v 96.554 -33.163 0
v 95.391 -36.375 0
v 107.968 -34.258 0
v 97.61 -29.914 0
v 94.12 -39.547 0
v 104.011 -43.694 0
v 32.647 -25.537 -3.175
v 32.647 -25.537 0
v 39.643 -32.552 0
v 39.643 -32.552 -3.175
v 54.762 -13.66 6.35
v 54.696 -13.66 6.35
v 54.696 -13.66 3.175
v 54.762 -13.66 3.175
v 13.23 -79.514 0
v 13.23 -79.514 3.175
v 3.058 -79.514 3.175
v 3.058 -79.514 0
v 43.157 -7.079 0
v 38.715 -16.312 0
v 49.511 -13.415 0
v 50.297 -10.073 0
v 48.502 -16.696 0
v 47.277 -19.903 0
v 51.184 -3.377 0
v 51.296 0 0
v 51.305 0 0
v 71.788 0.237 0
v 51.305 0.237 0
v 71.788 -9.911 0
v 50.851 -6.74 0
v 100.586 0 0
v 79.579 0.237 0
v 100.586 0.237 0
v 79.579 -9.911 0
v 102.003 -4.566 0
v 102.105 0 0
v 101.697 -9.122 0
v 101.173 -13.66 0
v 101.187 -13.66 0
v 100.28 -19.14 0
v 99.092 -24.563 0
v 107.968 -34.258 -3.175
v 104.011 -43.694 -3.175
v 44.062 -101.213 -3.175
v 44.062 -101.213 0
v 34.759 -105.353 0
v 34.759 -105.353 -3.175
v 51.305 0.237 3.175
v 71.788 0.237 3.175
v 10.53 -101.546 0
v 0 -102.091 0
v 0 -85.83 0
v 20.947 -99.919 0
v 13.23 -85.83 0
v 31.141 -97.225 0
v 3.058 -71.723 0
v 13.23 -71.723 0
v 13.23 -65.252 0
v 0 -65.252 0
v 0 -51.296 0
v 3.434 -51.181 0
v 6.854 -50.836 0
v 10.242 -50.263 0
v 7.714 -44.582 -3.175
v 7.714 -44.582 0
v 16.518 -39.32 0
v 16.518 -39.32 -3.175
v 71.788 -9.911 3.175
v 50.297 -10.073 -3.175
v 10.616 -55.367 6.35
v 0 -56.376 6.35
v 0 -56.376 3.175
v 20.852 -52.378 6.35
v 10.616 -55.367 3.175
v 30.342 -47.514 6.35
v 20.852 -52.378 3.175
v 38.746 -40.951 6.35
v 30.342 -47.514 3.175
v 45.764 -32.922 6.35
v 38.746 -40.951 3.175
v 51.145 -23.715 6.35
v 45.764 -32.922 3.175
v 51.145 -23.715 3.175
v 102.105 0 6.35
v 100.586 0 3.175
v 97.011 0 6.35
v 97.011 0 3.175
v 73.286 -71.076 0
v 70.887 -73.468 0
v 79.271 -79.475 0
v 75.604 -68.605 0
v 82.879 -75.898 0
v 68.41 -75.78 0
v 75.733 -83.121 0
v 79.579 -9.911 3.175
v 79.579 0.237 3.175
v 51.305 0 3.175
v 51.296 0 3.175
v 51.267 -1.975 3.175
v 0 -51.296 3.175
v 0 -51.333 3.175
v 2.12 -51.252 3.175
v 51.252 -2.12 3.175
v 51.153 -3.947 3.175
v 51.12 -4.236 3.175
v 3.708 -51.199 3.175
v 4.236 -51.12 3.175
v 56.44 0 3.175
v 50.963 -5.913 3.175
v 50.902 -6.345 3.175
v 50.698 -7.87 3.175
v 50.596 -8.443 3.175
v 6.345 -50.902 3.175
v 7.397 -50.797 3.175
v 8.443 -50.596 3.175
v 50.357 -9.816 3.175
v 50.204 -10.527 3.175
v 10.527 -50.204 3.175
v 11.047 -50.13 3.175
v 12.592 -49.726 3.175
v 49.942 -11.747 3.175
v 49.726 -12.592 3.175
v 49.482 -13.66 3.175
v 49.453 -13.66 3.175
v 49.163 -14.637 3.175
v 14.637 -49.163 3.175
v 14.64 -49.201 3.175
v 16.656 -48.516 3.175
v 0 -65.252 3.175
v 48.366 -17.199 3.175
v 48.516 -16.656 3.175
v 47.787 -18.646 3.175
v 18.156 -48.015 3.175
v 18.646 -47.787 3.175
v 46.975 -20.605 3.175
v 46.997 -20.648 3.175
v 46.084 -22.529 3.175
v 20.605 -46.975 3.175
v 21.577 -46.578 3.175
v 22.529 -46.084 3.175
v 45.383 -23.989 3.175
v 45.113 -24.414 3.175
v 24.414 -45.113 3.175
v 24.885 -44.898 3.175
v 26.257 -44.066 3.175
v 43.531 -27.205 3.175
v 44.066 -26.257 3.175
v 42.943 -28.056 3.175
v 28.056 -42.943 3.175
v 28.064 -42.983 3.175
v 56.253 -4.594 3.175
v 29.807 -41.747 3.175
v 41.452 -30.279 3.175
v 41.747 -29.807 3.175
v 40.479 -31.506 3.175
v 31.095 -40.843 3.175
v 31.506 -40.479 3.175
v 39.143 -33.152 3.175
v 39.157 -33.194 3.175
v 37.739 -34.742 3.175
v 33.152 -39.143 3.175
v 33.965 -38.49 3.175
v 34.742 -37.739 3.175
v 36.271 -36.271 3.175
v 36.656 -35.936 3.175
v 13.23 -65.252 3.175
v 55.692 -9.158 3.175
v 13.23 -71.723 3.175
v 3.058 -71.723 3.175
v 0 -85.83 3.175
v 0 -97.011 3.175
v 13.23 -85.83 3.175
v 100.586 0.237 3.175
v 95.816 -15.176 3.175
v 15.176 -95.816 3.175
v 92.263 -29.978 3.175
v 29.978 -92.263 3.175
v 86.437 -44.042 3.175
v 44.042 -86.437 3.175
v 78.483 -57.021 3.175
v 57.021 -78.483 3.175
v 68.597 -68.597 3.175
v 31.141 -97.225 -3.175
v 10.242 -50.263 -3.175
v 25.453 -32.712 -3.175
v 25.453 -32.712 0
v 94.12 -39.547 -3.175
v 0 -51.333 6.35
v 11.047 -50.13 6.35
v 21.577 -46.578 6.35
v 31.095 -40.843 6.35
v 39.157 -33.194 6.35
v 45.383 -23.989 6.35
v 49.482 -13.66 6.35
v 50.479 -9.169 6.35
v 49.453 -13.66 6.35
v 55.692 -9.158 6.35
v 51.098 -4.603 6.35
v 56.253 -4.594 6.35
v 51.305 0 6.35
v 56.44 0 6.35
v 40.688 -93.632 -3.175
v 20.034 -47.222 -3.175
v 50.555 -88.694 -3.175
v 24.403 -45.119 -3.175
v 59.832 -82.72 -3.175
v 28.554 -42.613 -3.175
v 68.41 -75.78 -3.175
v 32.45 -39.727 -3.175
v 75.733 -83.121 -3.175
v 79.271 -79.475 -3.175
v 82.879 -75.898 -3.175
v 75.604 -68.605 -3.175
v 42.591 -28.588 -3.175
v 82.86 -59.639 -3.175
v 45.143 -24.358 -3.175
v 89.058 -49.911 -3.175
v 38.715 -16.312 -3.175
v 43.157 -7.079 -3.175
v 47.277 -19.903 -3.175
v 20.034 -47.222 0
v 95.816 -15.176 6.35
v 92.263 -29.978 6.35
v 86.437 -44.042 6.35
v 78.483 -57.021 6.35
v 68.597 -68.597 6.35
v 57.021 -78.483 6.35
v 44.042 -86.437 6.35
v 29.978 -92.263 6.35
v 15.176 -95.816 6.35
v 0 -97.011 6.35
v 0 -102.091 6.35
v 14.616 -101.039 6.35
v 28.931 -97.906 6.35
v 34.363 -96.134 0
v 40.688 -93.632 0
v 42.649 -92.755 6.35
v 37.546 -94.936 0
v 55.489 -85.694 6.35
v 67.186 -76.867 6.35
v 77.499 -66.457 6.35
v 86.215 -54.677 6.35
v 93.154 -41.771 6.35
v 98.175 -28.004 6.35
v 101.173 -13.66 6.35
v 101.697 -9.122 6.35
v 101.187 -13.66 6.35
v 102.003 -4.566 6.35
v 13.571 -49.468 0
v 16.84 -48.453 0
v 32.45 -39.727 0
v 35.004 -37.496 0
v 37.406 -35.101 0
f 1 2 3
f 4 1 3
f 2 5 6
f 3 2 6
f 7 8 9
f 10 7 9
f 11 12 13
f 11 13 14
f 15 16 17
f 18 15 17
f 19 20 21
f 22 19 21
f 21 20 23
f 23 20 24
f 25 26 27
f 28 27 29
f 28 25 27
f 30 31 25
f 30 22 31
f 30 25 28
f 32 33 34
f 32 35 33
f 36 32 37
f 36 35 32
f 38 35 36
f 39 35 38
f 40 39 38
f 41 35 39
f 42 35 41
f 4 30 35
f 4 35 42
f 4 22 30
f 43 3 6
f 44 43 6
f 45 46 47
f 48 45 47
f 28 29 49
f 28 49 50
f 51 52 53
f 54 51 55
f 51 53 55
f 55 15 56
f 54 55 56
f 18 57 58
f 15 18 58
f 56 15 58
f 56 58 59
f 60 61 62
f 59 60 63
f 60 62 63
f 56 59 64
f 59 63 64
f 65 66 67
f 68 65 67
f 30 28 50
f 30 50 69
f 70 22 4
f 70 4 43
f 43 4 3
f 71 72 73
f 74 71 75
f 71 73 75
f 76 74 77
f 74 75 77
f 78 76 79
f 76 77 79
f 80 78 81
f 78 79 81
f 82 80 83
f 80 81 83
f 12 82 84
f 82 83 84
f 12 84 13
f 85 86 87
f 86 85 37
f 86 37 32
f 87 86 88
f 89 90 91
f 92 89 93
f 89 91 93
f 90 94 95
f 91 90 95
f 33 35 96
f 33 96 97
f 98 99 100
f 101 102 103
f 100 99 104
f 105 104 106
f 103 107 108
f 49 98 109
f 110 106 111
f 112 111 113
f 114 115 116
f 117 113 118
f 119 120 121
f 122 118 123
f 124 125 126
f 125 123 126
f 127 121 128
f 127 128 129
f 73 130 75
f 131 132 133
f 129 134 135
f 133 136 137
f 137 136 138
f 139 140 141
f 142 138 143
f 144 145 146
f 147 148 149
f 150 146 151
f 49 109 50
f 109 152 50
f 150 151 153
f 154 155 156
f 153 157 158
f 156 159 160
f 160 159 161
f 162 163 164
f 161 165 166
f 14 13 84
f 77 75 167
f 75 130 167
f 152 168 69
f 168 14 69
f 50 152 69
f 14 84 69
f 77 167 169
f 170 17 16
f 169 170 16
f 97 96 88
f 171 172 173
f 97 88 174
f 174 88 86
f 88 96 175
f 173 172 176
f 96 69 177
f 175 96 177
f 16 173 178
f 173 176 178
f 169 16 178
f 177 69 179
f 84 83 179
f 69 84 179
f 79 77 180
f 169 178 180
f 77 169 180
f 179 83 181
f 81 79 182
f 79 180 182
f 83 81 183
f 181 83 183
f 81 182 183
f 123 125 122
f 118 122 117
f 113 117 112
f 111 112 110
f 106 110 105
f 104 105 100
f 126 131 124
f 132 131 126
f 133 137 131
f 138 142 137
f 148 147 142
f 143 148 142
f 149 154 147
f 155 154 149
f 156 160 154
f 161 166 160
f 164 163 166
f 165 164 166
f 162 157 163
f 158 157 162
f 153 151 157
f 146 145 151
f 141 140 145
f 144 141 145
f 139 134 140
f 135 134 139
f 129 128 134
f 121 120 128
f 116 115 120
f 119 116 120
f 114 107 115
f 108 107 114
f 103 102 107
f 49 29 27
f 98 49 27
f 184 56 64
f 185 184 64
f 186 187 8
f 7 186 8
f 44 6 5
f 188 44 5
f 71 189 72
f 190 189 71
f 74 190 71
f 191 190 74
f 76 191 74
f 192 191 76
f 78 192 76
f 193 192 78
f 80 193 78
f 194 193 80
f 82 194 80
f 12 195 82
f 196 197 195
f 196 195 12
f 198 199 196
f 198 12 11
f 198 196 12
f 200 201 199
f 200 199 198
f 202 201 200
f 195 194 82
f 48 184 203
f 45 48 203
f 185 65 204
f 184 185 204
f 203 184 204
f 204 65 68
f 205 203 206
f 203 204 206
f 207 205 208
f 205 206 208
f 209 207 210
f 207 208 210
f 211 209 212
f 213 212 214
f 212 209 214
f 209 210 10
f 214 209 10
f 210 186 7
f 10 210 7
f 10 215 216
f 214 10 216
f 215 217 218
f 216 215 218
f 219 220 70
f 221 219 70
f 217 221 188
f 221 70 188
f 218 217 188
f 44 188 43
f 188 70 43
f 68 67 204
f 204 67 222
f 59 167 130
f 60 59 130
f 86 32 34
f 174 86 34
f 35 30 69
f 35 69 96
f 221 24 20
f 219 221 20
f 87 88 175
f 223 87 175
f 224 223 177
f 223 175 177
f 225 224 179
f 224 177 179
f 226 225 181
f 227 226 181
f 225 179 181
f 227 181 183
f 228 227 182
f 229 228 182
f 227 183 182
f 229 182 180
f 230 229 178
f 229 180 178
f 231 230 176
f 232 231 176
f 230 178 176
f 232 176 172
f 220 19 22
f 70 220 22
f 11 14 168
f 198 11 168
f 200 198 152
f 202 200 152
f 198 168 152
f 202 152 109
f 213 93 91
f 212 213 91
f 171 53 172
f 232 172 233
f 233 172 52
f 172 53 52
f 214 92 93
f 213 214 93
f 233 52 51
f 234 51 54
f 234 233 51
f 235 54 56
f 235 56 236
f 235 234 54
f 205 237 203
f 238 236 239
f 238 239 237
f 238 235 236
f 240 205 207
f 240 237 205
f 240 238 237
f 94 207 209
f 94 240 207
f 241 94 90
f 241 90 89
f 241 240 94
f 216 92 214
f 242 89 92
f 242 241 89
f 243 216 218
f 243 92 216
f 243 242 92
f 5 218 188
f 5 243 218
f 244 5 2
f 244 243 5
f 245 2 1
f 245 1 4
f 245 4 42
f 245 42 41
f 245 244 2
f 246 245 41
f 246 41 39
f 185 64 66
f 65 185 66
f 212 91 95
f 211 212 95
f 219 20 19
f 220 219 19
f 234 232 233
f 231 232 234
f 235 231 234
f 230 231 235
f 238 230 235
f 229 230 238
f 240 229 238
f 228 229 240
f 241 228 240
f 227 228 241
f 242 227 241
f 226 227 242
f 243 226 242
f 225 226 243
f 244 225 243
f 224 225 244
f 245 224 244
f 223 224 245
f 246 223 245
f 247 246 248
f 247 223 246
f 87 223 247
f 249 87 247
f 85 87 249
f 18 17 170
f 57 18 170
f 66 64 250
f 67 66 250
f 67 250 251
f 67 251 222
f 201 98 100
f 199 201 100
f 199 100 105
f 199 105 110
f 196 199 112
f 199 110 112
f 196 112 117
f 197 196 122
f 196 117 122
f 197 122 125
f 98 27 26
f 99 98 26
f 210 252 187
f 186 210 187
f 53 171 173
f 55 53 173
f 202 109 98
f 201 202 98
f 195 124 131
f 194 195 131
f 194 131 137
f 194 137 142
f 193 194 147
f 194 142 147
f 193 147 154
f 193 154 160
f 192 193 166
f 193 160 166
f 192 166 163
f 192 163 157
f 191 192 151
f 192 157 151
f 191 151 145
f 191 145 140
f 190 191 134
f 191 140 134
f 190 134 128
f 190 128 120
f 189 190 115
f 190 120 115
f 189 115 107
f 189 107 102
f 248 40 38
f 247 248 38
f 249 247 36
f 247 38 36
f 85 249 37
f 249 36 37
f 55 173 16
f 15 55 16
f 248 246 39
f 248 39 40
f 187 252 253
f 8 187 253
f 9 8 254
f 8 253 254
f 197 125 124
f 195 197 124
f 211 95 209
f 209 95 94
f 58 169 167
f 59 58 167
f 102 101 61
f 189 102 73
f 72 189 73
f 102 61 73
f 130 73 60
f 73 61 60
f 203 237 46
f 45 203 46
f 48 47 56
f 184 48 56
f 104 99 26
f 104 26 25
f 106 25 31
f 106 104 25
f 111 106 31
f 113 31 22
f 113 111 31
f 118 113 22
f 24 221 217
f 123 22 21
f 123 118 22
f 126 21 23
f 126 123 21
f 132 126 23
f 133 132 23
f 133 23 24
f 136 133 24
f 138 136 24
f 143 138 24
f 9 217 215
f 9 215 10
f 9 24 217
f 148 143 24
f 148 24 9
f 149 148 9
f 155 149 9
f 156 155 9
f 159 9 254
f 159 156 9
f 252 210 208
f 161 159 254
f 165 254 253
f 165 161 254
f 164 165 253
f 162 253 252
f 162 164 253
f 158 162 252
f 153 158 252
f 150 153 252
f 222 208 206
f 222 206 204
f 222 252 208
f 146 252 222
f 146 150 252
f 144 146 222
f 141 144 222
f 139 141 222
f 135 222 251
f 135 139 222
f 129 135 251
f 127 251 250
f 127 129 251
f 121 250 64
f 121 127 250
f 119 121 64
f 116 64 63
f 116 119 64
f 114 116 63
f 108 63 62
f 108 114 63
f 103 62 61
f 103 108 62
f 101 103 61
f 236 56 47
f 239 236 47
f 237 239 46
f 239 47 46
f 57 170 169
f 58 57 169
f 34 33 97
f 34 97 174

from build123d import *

# Parameters (mm, degrees)
F1_DEPTH  = 3.175
F4_DEPTH  = 3.175
F6_DEPTH  = 6.35
F7_DEPTH  = 3.175
F9_DEPTH  = 25.4
F11_DEPTH = 3.175
F13_DEPTH = 3.175
F14_DEPTH = 3.175
F15_DEPTH = 6.351


with BuildPart() as f1:
    # F0 (on Top) → F1 (new body)
    with BuildSketch(Plane.XY):
        with BuildLine():
            Line((0, -51.2956328023), (0, -102.09075941))
            ThreePointArc((0, -102.09075941), (72.1890682753, -72.1890682753), (102.09075941, 0))
            Line((102.09075941, 0), (51.2956328023, 0))
            ThreePointArc((51.2956328023, 0), (36.2714897998, -36.2714897998), (0, -51.2956328023))
        make_face()
    extrude(amount=F1_DEPTH)

    # F3 (on face) → F4 (join)
    with BuildSketch(Plane.XY.offset(3.175)):
        with BuildLine():
            ThreePointArc((0, -56.3756328023), (39.8635922482, -39.8635922482), (56.3756328023, 0))
            Line((56.3756328023, 0), (51.3330261441, 0))
            ThreePointArc((51.3330261441, 0), (36.2979308853, -36.2979308853), (0, -51.3330261441))
            Line((0, -51.3330261441), (0, -56.3756328023))
        make_face()
        with BuildLine():
            Line((102.09075941, 0), (97.01075941, 0))
            ThreePointArc((97.01075941, 0), (68.5969658269, -68.5969658269), (0, -97.01075941))
            Line((0, -97.01075941), (0, -102.09075941))
            ThreePointArc((0, -102.09075941), (72.1890682753, -72.1890682753), (102.09075941, 0))
        make_face()
    extrude(amount=F4_DEPTH)

    # F5 (on Top) → F6 (join)
    with BuildSketch(Plane.XY):
        with BuildLine():
            ThreePointArc((54.7619331998, -13.660392724), (56.0189261095, -6.8815386855), (56.4400182242, 0))
            Line((56.4400182242, 0), (51.3051767249, 0))
            ThreePointArc((51.3051767249, 0), (50.8400637591, -6.8926827684), (49.4531579316, -13.660392724))
            Line((49.4531579316, -13.660392724), (54.7619331998, -13.660392724))
        make_face()
        with BuildLine():
            Line((102.1051767249, 0), (97.1390098326, 0))
            ThreePointArc((97.1390098326, 0), (96.8973822865, -6.8472284381), (96.1737017167, -13.660392724))
            Line((96.1737017167, -13.660392724), (101.1872560388, -13.660392724))
            ThreePointArc((101.1872560388, -13.660392724), (101.8754380952, -6.8455990928), (102.1051767249, 0))
        make_face()
    extrude(amount=F6_DEPTH)

    # F2 (on Top) → F7 (join)
    with BuildSketch(Plane.XY):
        Polygon((65.3862244444, -13.4132344524), (65.3862244444, 0.2373858813), (51.3049019501, 0.2373858813), (51.3049019501, -13.4632168472), align=None)
        Polygon((100.5855267867, 0.2373858813), (85.8938746733, 0.2373858813), (85.9641355587, -13.4132344524), (100.5855267867, -13.4132344524), align=None)
    extrude(amount=F7_DEPTH)

    # F8 (on face) → F9 (cut)
    with BuildSketch(Plane.XY.offset(3.175)):
        Polygon((0, -85.8303158734), (13.2304336887, -85.8303158734), (13.2304336887, -79.5142199461), (6.7552071823, -79.5142199461), (3.0578118576, -79.5142199461), (3.0578118576, -71.7228521654), (6.7552071823, -71.7228521654), (13.2304336887, -71.7228521654), (13.2304336887, -65.2524047592), (0, -65.2524047592), align=None)
    extrude(amount=-F9_DEPTH, mode=Mode.SUBTRACT)

    # F10 (on face) → F11 (join)
    with BuildSketch(Plane(origin=(0, 0, 0), x_dir=(1, 0, 0), z_dir=(0, 0, -1))):
        with BuildLine():
            ThreePointArc((39.6434592285, 32.5520826521), (37.980845771, 34.4774897449), (36.2248193412, 36.3181002847))
            Line((36.2248193412, 36.3181002847), (29.0498583475, 29.1246633635))
            Line((29.0498583475, 29.1246633635), (32.646576808, 25.5371828667))
            Line((32.646576808, 25.5371828667), (39.6434592285, 32.5520826521))
        make_face()
        with BuildLine():
            Line((29.0498583475, 29.1246633635), (36.2248193412, 36.3181002847))
            ThreePointArc((36.2248193412, 36.3181002847), (34.3796988436, 38.0693873344), (32.4500223073, 39.7270436459))
            Line((32.4500223073, 39.7270436459), (25.4531398869, 32.7121438604))
            Line((25.4531398869, 32.7121438604), (29.0498583475, 29.1246633635))
        make_face()
        with BuildLine():
            Line((36.2248193412, 36.3181002847), (72.0961827352, 72.2818344532))
            ThreePointArc((72.0961827352, 72.2818344532), (70.2749350461, 74.0537417095), (68.4101530773, 75.7797737714))
            Line((68.4101530773, 75.7797737714), (32.4500223073, 39.7270436459))
            ThreePointArc((32.4500223073, 39.7270436459), (34.3796988436, 38.0693873344), (36.2248193412, 36.3181002847))
        make_face()
        with BuildLine():
            ThreePointArc((75.6035899985, 68.6048127777), (73.8727679087, 70.4651496728), (72.0961827352, 72.2818344532))
            Line((72.0961827352, 72.2818344532), (36.2248193412, 36.3181002847))
            ThreePointArc((36.2248193412, 36.3181002847), (37.980845771, 34.4774897449), (39.6434592285, 32.5520826521))
            Line((39.6434592285, 32.5520826521), (75.6035899985, 68.6048127777))
        make_face()
        with BuildLine():
            Line((79.271143729, 79.4752713743), (72.0961827352, 72.2818344532))
            ThreePointArc((72.0961827352, 72.2818344532), (73.8727679087, 70.4651496728), (75.6035899985, 68.6048127777))
            Line((75.6035899985, 68.6048127777), (82.8785053866, 75.8984614814))
            Line((82.8785053866, 75.8984614814), (79.271143729, 79.4752713743))
        make_face()
        with BuildLine():
            ThreePointArc((68.4101530773, 75.7797737714), (70.2749350461, 74.0537417095), (72.0961827352, 72.2818344532))
            Line((72.0961827352, 72.2818344532), (79.271143729, 79.4752713743))
            Line((79.271143729, 79.4752713743), (75.7328631666, 83.1213402502))
            Line((75.7328631666, 83.1213402502), (68.4101530773, 75.7797737714))
        make_face()
        with BuildLine():
            Line((20.0341812257, 47.2215366883), (40.6881574418, 93.6322433828))
            ThreePointArc((40.6881574418, 93.6322433828), (35.9596571955, 95.5480309127), (31.1413521737, 97.2251991086))
            Line((31.1413521737, 97.2251991086), (10.2418471319, 50.2627746142))
            ThreePointArc((10.2418471319, 50.2627746142), (15.2141958482, 48.9874493037), (20.0341812257, 47.2215366883))
        make_face()
        with BuildLine():
            ThreePointArc((31.1413521737, 97.2251991086), (35.9596571955, 95.5480309127), (40.6881574418, 93.6322433828))
            Line((40.6881574418, 93.6322433828), (44.0618023276, 101.2130230665))
            Line((44.0618023276, 101.2130230665), (34.7585338749, 105.353220427))
            Line((34.7585338749, 105.353220427), (31.1413521737, 97.2251991086))
        make_face()
        with BuildLine():
            Line((16.5176168084, 39.3196083605), (20.0341812257, 47.2215366883))
            ThreePointArc((20.0341812257, 47.2215366883), (15.2141958482, 48.9874493037), (10.2418471319, 50.2627746142))
            Line((10.2418471319, 50.2627746142), (7.7137911807, 44.5820833017))
            Line((7.7137911807, 44.5820833017), (16.5176168084, 39.3196083605))
        make_face()
        with BuildLine():
            ThreePointArc((50.2968928634, 10.0729594896), (49.0339423103, 15.0636796999), (47.2771132537, 19.902675875))
            Line((47.2771132537, 19.902675875), (38.7149937451, 16.3121093065))
            Line((38.7149937451, 16.3121093065), (43.1567628434, 7.0787111473))
            Line((43.1567628434, 7.0787111473), (50.2968928634, 10.0729594896))
        make_face()
        with BuildLine():
            ThreePointArc((97.6098508897, 29.9138791566), (95.9858944102, 34.7740022313), (94.1201154327, 39.5465172658))
            Line((94.1201154327, 39.5465172658), (47.2771132537, 19.902675875))
            ThreePointArc((47.2771132537, 19.902675875), (49.0339423103, 15.0636796999), (50.2968928634, 10.0729594896))
            Line((50.2968928634, 10.0729594896), (97.6098508897, 29.9138791566))
        make_face()
        with BuildLine():
            Line((104.0109246969, 43.6942763627), (94.1201154327, 39.5465172658))
            ThreePointArc((94.1201154327, 39.5465172658), (95.9858944102, 34.7740022313), (97.6098508897, 29.9138791566))
            Line((97.6098508897, 29.9138791566), (107.9681979582, 34.2577025116))
            Line((107.9681979582, 34.2577025116), (104.0109246969, 43.6942763627))
        make_face()
    extrude(amount=F11_DEPTH)

    # F12 (on face) → F13 (join)
    with BuildSketch(Plane(origin=(0, 0, 0), x_dir=(1, 0, 0), z_dir=(0, 0, -1))):
        Polygon((65.3862244444, 0), (65.3862244444, -0.2373858813), (85.8938746733, -0.2373858813), (85.8950965183, 0), align=None)
    extrude(amount=-F13_DEPTH)

    # F14 (add): faces of the model
    f14_faces = [f1.faces().sort_by_distance(p)[0] for p in [
        (67.5252079874, -42.3895565008, 0),
        (42.5870000815, -67.3227346229, 0),
    ]]
    extrude(f14_faces, amount=F14_DEPTH)

    # F2 (on Top) → F15 (cut, through all)
    with BuildSketch(Plane.XY):
        Polygon((79.5788919434, -9.9109848417), (79.5788919434, -6.2948371671), (79.5788919434, 0.2373858813), (71.7875241627, 0.2373858813), (71.7875241627, -6.2948371671), (71.7875241627, -9.9109848417), align=None)
    extrude(amount=F15_DEPTH, mode=Mode.SUBTRACT)


solid = f1.part
